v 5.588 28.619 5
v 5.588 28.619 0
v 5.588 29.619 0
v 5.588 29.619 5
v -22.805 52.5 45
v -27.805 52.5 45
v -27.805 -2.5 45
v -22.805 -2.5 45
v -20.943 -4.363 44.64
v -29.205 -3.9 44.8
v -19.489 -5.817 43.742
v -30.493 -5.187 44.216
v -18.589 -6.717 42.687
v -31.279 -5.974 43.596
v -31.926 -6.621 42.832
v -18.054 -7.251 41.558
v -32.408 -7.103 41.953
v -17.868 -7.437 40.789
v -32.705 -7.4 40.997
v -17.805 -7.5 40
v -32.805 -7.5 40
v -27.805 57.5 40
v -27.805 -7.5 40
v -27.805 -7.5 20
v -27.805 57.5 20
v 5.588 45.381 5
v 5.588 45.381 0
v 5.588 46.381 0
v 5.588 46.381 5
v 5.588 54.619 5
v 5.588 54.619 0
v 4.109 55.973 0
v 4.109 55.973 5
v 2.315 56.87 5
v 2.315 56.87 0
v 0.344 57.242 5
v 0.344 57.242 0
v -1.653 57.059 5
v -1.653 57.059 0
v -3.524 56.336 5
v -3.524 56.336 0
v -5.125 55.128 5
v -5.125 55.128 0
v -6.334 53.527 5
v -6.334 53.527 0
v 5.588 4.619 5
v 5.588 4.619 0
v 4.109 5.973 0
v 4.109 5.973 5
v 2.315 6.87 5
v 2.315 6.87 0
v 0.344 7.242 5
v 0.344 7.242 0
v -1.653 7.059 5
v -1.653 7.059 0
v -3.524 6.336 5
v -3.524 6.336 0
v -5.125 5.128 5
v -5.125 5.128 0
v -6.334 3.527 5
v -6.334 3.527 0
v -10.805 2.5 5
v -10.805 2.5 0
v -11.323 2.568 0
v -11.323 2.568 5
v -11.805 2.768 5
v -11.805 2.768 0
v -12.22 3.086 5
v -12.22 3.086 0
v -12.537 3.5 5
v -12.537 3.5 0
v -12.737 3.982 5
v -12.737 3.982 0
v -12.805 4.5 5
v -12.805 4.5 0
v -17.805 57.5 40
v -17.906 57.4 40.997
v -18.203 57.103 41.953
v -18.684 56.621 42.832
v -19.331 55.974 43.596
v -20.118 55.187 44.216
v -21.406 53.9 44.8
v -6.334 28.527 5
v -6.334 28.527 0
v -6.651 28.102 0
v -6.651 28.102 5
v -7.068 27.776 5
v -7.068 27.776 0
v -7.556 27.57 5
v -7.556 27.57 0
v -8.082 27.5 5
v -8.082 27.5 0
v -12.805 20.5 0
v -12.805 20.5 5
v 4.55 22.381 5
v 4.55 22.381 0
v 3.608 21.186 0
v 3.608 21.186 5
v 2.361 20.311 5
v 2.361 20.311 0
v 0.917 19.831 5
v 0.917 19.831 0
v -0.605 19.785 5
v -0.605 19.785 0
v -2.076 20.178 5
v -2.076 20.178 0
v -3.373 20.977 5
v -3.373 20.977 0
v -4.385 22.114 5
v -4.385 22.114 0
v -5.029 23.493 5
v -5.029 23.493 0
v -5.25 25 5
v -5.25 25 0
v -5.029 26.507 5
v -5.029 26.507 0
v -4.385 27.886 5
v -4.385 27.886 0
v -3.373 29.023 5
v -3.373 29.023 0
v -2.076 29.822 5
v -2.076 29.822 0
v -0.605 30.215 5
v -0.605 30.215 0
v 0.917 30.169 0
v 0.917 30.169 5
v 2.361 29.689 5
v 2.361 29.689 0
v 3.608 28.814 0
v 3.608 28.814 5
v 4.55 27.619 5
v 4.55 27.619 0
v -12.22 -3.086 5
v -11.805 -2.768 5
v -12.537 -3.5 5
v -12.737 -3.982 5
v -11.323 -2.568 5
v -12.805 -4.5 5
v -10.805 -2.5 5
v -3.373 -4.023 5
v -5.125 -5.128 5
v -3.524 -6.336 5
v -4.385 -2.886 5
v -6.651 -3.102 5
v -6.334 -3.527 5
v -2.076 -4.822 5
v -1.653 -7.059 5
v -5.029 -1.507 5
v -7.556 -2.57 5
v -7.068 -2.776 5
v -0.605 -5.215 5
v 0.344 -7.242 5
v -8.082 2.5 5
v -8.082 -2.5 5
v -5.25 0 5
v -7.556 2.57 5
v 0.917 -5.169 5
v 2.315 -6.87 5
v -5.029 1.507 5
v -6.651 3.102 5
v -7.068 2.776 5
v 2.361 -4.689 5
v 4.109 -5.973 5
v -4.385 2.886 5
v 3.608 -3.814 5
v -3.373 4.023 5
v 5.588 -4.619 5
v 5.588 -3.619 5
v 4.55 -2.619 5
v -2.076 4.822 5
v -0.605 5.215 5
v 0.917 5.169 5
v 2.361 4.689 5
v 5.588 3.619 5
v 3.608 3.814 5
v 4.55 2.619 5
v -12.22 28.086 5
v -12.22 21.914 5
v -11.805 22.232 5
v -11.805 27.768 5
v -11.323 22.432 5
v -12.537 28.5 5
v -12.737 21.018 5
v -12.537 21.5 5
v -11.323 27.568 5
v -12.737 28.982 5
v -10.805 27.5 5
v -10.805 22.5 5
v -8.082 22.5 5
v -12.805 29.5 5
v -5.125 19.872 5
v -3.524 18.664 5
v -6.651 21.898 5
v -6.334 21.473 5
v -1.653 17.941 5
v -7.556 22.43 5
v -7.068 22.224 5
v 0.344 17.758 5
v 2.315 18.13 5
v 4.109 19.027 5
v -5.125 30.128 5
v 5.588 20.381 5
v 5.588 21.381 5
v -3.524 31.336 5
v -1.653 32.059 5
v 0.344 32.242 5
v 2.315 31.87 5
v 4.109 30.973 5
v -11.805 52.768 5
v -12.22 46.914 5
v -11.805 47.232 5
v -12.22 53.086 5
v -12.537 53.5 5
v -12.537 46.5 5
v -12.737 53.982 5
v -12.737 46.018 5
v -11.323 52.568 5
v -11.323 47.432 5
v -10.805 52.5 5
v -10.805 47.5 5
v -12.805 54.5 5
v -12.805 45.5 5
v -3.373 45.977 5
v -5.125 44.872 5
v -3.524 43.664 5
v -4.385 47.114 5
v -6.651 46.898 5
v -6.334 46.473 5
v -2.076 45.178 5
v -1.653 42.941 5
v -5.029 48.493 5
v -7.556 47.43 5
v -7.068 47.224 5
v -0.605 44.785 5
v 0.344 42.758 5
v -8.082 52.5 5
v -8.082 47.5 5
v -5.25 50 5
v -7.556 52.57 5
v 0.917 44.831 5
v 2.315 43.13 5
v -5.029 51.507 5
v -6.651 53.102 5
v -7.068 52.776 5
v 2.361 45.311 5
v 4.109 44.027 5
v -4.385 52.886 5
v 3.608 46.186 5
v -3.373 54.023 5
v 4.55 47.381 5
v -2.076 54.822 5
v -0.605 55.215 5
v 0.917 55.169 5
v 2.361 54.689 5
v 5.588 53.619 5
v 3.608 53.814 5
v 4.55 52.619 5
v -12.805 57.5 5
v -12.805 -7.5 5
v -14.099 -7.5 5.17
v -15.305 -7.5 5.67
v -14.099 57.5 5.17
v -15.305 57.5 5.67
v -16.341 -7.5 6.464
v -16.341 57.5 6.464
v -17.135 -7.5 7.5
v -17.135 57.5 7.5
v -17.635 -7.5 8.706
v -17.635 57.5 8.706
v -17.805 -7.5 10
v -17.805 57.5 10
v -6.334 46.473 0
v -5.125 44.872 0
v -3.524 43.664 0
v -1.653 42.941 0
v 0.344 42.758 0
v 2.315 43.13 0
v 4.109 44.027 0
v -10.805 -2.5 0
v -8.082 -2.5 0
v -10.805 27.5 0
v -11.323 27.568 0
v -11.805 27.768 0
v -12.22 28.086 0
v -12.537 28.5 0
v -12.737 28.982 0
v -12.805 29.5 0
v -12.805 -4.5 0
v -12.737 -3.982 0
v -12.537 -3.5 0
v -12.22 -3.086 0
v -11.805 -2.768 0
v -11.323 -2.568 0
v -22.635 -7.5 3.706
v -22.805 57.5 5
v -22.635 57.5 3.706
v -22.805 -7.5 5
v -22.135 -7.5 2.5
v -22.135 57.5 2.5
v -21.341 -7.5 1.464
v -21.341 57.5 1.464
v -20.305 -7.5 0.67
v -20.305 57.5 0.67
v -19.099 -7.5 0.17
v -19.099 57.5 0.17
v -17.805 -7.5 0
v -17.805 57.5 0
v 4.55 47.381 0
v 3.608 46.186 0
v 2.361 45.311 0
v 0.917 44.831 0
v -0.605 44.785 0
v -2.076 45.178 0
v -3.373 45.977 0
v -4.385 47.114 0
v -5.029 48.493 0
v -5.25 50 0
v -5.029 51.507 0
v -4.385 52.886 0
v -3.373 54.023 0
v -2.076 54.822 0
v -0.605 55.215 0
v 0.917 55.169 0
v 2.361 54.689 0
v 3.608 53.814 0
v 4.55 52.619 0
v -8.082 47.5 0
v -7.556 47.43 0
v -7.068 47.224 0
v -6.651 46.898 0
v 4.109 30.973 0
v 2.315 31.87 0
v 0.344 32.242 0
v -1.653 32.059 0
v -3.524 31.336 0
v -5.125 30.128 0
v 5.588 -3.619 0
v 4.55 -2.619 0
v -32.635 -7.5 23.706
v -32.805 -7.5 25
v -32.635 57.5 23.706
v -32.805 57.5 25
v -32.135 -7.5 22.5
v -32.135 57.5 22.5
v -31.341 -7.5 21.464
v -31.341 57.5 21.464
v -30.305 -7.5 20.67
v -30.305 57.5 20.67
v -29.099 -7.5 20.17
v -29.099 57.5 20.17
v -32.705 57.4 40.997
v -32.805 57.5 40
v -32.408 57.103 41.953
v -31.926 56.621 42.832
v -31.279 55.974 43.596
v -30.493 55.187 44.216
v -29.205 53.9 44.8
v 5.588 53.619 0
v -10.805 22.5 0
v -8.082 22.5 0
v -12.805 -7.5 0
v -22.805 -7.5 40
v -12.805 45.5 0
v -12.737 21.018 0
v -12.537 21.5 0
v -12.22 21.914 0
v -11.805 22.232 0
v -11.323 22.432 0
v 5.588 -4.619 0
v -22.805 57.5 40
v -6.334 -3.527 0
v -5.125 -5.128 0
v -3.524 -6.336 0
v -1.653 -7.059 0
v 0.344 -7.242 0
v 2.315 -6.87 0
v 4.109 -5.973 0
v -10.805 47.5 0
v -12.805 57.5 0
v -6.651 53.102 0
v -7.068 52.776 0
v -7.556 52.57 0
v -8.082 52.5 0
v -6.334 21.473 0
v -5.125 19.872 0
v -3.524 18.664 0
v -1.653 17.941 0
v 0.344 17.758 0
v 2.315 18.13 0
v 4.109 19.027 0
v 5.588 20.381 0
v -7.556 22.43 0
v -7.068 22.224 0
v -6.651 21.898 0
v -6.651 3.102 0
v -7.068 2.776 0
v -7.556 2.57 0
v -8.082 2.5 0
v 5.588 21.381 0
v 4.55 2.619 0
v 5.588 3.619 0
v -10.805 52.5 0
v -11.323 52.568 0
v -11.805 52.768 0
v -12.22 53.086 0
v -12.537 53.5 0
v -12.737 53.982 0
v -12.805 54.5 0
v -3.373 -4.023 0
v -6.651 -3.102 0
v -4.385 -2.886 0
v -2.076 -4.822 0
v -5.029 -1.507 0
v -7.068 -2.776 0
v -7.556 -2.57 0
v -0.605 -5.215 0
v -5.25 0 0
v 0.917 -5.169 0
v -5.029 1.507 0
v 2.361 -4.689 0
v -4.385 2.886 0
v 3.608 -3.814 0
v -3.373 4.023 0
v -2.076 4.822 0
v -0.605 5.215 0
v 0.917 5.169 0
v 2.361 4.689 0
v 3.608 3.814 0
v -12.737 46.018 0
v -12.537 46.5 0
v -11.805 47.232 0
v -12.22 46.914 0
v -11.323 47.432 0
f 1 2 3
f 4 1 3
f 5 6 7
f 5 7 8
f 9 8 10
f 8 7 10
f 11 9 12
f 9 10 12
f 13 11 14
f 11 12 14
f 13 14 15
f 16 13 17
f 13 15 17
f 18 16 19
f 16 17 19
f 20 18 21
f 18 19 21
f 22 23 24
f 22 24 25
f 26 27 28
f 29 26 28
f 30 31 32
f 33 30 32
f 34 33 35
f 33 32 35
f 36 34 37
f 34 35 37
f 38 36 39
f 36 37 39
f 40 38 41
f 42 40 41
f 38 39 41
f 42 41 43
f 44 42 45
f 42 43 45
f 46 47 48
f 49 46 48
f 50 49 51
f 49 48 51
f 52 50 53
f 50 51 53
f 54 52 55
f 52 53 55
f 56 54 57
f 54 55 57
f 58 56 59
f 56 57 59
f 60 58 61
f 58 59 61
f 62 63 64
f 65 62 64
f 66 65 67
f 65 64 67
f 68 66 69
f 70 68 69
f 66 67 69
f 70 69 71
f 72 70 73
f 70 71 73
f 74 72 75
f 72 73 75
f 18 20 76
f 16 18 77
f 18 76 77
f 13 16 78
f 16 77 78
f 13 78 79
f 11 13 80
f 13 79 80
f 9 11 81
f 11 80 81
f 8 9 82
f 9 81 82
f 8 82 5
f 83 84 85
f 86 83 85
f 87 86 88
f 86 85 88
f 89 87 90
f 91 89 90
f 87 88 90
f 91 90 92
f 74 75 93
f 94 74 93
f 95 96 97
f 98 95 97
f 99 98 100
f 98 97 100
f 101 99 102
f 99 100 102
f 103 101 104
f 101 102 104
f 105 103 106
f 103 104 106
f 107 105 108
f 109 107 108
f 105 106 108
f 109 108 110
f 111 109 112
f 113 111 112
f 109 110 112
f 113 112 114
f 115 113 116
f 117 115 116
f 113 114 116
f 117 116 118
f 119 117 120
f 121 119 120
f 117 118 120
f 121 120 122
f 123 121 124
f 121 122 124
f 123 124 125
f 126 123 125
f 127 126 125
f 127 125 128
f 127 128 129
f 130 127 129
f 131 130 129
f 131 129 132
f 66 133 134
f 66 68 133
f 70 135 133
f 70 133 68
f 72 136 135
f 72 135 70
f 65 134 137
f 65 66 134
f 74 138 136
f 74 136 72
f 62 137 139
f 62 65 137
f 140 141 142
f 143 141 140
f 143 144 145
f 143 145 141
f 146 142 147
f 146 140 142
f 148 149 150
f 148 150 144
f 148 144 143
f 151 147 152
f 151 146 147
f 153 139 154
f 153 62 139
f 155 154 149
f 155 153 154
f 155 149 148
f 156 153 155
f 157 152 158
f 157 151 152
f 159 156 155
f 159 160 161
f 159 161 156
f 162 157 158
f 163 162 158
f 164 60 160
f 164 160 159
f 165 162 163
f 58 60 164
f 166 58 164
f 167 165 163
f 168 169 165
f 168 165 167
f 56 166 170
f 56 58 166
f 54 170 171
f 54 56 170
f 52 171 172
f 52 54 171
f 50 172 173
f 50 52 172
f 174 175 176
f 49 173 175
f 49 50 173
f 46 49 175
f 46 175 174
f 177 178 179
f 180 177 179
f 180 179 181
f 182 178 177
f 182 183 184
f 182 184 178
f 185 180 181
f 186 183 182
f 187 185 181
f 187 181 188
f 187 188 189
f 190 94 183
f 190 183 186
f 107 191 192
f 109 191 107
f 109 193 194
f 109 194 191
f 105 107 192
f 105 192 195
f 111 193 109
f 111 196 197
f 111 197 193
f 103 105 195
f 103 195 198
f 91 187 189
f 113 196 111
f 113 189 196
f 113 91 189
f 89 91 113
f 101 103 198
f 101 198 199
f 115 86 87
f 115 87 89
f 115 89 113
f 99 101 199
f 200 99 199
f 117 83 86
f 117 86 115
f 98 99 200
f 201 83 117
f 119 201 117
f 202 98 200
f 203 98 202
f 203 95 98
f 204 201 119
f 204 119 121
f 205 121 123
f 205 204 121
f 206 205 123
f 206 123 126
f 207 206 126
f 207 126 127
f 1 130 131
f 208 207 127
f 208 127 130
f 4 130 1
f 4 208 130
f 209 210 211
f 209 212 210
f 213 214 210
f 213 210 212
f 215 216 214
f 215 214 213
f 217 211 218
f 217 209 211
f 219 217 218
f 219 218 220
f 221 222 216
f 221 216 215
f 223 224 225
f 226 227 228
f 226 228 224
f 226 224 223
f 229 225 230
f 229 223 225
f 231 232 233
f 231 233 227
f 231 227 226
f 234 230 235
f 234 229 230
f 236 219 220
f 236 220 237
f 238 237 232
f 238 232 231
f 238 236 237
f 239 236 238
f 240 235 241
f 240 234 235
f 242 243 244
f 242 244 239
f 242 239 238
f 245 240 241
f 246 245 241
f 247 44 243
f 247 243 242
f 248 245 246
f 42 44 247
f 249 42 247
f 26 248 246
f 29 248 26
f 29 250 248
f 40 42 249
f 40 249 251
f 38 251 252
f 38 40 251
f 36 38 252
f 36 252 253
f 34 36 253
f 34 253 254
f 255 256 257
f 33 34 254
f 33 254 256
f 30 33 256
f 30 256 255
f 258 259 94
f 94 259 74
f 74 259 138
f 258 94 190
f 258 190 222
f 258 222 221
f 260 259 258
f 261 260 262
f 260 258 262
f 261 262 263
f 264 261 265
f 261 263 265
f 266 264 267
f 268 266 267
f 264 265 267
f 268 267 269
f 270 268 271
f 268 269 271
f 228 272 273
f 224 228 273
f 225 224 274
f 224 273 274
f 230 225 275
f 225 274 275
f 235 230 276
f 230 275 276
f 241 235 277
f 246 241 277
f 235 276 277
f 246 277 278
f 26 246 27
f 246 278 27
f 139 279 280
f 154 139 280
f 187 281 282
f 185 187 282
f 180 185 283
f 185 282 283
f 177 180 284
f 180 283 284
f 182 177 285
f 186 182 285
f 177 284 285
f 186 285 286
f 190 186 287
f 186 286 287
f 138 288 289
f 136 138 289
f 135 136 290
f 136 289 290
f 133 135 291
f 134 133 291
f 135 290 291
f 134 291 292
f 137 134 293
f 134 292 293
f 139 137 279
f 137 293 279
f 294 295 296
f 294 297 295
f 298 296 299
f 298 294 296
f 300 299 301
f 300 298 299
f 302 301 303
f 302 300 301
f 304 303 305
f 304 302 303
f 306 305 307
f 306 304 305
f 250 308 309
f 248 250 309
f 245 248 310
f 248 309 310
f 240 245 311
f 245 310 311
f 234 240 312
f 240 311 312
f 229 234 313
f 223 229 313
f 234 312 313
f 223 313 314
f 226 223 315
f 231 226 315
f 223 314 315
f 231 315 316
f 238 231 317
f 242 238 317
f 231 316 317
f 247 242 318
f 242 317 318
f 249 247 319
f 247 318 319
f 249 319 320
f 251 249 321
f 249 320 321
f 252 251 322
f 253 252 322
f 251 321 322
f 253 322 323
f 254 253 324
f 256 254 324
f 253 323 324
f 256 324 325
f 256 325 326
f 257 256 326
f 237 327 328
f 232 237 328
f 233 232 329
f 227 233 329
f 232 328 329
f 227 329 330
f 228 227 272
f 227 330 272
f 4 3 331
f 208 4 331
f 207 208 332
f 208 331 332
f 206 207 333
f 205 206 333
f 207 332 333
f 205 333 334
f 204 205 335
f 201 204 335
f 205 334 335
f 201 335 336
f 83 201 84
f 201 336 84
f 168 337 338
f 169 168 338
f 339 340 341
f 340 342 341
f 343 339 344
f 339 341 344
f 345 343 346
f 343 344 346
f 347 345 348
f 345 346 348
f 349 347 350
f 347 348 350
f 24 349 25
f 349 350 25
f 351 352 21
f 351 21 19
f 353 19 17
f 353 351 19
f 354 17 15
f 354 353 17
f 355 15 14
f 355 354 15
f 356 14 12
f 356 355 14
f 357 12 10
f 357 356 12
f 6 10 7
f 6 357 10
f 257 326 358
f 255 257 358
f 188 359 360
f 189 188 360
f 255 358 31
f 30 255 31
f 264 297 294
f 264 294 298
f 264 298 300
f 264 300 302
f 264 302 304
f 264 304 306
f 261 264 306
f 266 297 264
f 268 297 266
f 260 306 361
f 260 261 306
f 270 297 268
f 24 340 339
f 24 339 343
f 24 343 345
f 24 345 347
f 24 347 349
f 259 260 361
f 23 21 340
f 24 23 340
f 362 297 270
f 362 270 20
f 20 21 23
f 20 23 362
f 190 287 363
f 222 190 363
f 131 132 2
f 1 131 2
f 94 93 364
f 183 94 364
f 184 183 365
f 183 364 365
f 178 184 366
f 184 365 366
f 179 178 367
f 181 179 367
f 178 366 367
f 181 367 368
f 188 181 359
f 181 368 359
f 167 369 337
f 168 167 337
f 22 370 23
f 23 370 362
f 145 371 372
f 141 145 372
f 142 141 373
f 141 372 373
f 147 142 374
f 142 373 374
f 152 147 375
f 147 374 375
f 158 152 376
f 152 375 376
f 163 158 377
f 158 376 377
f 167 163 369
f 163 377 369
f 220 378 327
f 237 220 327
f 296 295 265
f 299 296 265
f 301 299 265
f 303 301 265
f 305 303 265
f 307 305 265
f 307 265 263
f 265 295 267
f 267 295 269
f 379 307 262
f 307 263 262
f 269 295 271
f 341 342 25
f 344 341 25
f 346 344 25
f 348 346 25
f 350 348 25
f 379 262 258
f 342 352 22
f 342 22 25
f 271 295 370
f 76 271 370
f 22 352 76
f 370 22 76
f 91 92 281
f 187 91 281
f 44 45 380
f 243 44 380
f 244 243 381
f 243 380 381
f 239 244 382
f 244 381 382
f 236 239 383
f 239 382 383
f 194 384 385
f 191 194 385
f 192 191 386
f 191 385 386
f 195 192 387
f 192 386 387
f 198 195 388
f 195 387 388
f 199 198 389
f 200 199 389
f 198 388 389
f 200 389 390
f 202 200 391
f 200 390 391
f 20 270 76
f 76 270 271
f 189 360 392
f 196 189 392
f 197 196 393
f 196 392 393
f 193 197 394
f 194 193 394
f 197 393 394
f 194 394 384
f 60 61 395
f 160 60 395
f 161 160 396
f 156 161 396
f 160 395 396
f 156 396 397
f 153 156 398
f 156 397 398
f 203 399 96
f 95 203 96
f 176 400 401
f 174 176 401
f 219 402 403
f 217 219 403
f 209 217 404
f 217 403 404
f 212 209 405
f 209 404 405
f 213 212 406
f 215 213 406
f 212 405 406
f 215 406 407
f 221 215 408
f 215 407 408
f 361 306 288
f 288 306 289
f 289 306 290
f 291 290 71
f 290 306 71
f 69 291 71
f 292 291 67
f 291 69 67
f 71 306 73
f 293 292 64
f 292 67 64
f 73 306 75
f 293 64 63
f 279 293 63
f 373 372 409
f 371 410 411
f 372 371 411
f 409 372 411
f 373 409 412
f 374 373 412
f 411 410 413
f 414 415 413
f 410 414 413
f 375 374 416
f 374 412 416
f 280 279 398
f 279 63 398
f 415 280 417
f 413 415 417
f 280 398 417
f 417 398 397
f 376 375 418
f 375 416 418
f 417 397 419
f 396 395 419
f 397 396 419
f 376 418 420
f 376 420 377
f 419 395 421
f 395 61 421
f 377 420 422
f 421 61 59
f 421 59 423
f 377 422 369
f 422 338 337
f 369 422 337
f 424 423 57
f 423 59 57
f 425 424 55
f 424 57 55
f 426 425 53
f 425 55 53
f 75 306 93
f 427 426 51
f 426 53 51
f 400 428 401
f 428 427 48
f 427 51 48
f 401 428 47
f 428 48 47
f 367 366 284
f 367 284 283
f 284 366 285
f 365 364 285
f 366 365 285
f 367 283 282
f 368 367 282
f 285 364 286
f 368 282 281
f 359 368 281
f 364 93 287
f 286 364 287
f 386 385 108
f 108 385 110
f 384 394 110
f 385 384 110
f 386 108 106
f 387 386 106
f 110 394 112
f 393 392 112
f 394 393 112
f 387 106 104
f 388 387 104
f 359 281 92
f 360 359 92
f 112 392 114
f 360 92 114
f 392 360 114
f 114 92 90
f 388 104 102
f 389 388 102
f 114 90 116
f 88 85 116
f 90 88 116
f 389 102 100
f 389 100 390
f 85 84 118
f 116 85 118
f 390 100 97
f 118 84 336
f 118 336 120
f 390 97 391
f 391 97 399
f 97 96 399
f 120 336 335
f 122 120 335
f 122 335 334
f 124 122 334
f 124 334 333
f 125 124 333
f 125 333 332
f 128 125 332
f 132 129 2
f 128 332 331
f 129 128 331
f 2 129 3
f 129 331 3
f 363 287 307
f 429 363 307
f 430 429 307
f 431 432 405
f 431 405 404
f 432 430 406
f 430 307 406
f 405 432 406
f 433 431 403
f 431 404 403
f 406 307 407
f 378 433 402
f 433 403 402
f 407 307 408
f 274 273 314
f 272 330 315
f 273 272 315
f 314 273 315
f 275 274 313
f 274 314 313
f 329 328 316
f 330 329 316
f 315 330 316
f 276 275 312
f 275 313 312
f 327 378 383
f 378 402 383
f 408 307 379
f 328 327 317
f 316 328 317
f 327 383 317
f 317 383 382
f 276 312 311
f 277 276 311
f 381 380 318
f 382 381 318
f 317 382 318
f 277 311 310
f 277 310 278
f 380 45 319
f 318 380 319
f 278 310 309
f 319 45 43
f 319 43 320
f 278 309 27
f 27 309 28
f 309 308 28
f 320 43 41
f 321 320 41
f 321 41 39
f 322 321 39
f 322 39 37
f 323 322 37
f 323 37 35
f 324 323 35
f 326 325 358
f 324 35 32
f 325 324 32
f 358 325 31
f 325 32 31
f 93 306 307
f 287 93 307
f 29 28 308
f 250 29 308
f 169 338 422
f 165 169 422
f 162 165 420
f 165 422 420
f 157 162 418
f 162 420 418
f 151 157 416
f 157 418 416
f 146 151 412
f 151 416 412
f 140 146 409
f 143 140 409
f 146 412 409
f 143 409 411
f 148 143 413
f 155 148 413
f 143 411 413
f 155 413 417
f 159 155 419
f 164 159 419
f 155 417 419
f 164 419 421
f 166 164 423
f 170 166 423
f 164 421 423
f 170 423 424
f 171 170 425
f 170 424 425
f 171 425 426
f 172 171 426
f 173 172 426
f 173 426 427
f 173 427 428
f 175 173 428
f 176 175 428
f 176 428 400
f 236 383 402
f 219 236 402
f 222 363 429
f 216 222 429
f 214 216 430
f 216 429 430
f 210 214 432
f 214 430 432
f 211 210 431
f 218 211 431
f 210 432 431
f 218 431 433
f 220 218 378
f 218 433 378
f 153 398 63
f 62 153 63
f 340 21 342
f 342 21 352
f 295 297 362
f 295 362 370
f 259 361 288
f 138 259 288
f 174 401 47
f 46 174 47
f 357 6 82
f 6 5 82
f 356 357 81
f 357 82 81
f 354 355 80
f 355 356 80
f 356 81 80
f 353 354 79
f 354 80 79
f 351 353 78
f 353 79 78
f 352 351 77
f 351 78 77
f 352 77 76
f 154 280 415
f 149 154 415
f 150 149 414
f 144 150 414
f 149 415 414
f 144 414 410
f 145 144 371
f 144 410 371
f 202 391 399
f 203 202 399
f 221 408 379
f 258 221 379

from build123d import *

# Parameters (mm, degrees)
F1_DEPTH = 5
F2_W     = 5
F2_H     = 65
F3_DEPTH = 40
F4_W     = 65
F4_H     = 5
F5_DEPTH = 5
F6_W     = 5
F6_H     = 65
F7_DEPTH = 25
F8_R     = 4.99999


# Not quite as in the source:
# - a fillet or chamfer is up to 0.001 mm smaller than in the source, because OpenCascade refuses the exact size


with BuildPart() as f1:
    # F0 (on Top) → F1 (new body)
    with BuildSketch(Plane.XY):
        with BuildLine():
            ThreePointArc((4.5503406659, -2.6185682776), (-5.25, 0), (4.5503406659, 2.6185682776))
            Line((4.5503406659, 2.6185682776), (5.5884995361, 3.6185682776))
            Line((5.5884995361, 3.6185682776), (5.5884995361, 4.6185682776))
            ThreePointArc((5.5884995361, 4.6185682776), (-0.6609820827, 7.2198062776), (-6.3342387349, 3.527027027))
            ThreePointArc((-6.3342387349, 3.527027027), (-7.0681915182, 2.7757688748), (-8.0816149376, 2.5))
            Line((-8.0816149376, 2.5), (-10.8053287944, 2.5))
            ThreePointArc((-10.8053287944, 2.5), (-12.2195423568, 3.0857864376), (-12.8053287944, 4.5))
            Line((-12.8053287944, 4.5), (-12.8053287944, 20.5))
            ThreePointArc((-12.8053287944, 20.5), (-12.2195423568, 21.9142135624), (-10.8053287944, 22.5))
            Line((-10.8053287944, 22.5), (-8.0816149376, 22.5))
            ThreePointArc((-8.0816149376, 22.5), (-7.0681915182, 22.2242311252), (-6.3342387349, 21.472972973))
            ThreePointArc((-6.3342387349, 21.472972973), (-0.6609820827, 17.7801937224), (5.5884995361, 20.3814317224))
            Line((5.5884995361, 20.3814317224), (5.5884995361, 21.3814317224))
            Line((5.5884995361, 21.3814317224), (4.5503406659, 22.3814317224))
            ThreePointArc((4.5503406659, 22.3814317224), (-5.25, 25), (4.5503406659, 27.6185682776))
            Line((4.5503406659, 27.6185682776), (5.5884995361, 28.6185682776))
            Line((5.5884995361, 28.6185682776), (5.5884995361, 29.6185682776))
            ThreePointArc((5.5884995361, 29.6185682776), (-0.6609820827, 32.2198062776), (-6.3342387349, 28.527027027))
            ThreePointArc((-6.3342387349, 28.527027027), (-7.0681915182, 27.7757688748), (-8.0816149376, 27.5))
            Line((-8.0816149376, 27.5), (-10.8053287944, 27.5))
            ThreePointArc((-10.8053287944, 27.5), (-12.2195423568, 28.0857864376), (-12.8053287944, 29.5))
            Line((-12.8053287944, 29.5), (-12.8053287944, 45.5))
            ThreePointArc((-12.8053287944, 45.5), (-12.2195423568, 46.9142135624), (-10.8053287944, 47.5))
            Line((-10.8053287944, 47.5), (-8.0816149376, 47.5))
            ThreePointArc((-8.0816149376, 47.5), (-7.0681915182, 47.2242311252), (-6.3342387349, 46.472972973))
            ThreePointArc((-6.3342387349, 46.472972973), (-0.6609820827, 42.7801937224), (5.5884995361, 45.3814317224))
            Line((5.5884995361, 45.3814317224), (5.5884995361, 46.3814317224))
            Line((5.5884995361, 46.3814317224), (4.5503406659, 47.3814317224))
            ThreePointArc((4.5503406659, 47.3814317224), (-5.25, 50), (4.5503406659, 52.6185682776))
            Line((4.5503406659, 52.6185682776), (5.5884995361, 53.6185682776))
            Line((5.5884995361, 53.6185682776), (5.5884995361, 54.6185682776))
            ThreePointArc((5.5884995361, 54.6185682776), (-0.6609820827, 57.2198062776), (-6.3342387349, 53.527027027))
            ThreePointArc((-6.3342387349, 53.527027027), (-7.0681915182, 52.7757688748), (-8.0816149376, 52.5))
            Line((-8.0816149376, 52.5), (-10.8053287944, 52.5))
            ThreePointArc((-10.8053287944, 52.5), (-12.2195423568, 53.0857864376), (-12.8053287944, 54.5))
            Line((-12.8053287944, 54.5), (-12.8053287944, 57.5))
            Line((-12.8053287944, 57.5), (-22.8053287944, 57.5))
            Line((-22.8053287944, 57.5), (-22.8053287944, -7.5))
            Line((-22.8053287944, -7.5), (-12.8053287944, -7.5))
            Line((-12.8053287944, -7.5), (-12.8053287944, -4.5))
            ThreePointArc((-12.8053287944, -4.5), (-12.2195423568, -3.0857864376), (-10.8053287944, -2.5))
            Line((-10.8053287944, -2.5), (-8.0816149376, -2.5))
            ThreePointArc((-8.0816149376, -2.5), (-7.0681915182, -2.7757688748), (-6.3342387349, -3.527027027))
            ThreePointArc((-6.3342387349, -3.527027027), (-0.6609820827, -7.2198062776), (5.5884995361, -4.6185682776))
            Line((5.5884995361, -4.6185682776), (5.5884995361, -3.6185682776))
            Line((5.5884995361, -3.6185682776), (4.5503406659, -2.6185682776))
        make_face()
    extrude(amount=F1_DEPTH)

    # F2 (on face) → F3 (join)
    with BuildSketch(Plane.XY.offset(5)):
        with Locations((-20.3053287944, 25)):
            Rectangle(F2_W, F2_H)
    extrude(amount=F3_DEPTH)

    # F4 (on face) → F5 (join)
    with BuildSketch(Plane(origin=(-22.8053287944, 0, 0), x_dir=(0, -1, 0), z_dir=(-1, 0, 0))):
        with Locations((-25, 42.5)):
            Rectangle(F4_W, F4_H)
    extrude(amount=F5_DEPTH)

    # F6 (on face) → F7 (join)
    with BuildSketch(Plane.XY.offset(45)):
        with Locations((-30.3053287944, 25)):
            Rectangle(F6_W, F6_H)
    extrude(amount=-F7_DEPTH)

    # F8 (radius 5 in the source; OpenCascade refuses exactly that, so slightly less here)
    f8_edges = [f1.edges().sort_by_distance(p)[0] for p in [
        (-32.805329, 25, 45),
        (-25.305329, -7.5, 45),
        (-17.805329, 25, 45),
        (-25.305329, 57.5, 45),
        (-17.805329, 25, 5),
        (-22.805329, 25, 0),
        (-32.805329, 25, 20),
    ]]
    fillet(f8_edges, radius=F8_R)


solid = f1.part
